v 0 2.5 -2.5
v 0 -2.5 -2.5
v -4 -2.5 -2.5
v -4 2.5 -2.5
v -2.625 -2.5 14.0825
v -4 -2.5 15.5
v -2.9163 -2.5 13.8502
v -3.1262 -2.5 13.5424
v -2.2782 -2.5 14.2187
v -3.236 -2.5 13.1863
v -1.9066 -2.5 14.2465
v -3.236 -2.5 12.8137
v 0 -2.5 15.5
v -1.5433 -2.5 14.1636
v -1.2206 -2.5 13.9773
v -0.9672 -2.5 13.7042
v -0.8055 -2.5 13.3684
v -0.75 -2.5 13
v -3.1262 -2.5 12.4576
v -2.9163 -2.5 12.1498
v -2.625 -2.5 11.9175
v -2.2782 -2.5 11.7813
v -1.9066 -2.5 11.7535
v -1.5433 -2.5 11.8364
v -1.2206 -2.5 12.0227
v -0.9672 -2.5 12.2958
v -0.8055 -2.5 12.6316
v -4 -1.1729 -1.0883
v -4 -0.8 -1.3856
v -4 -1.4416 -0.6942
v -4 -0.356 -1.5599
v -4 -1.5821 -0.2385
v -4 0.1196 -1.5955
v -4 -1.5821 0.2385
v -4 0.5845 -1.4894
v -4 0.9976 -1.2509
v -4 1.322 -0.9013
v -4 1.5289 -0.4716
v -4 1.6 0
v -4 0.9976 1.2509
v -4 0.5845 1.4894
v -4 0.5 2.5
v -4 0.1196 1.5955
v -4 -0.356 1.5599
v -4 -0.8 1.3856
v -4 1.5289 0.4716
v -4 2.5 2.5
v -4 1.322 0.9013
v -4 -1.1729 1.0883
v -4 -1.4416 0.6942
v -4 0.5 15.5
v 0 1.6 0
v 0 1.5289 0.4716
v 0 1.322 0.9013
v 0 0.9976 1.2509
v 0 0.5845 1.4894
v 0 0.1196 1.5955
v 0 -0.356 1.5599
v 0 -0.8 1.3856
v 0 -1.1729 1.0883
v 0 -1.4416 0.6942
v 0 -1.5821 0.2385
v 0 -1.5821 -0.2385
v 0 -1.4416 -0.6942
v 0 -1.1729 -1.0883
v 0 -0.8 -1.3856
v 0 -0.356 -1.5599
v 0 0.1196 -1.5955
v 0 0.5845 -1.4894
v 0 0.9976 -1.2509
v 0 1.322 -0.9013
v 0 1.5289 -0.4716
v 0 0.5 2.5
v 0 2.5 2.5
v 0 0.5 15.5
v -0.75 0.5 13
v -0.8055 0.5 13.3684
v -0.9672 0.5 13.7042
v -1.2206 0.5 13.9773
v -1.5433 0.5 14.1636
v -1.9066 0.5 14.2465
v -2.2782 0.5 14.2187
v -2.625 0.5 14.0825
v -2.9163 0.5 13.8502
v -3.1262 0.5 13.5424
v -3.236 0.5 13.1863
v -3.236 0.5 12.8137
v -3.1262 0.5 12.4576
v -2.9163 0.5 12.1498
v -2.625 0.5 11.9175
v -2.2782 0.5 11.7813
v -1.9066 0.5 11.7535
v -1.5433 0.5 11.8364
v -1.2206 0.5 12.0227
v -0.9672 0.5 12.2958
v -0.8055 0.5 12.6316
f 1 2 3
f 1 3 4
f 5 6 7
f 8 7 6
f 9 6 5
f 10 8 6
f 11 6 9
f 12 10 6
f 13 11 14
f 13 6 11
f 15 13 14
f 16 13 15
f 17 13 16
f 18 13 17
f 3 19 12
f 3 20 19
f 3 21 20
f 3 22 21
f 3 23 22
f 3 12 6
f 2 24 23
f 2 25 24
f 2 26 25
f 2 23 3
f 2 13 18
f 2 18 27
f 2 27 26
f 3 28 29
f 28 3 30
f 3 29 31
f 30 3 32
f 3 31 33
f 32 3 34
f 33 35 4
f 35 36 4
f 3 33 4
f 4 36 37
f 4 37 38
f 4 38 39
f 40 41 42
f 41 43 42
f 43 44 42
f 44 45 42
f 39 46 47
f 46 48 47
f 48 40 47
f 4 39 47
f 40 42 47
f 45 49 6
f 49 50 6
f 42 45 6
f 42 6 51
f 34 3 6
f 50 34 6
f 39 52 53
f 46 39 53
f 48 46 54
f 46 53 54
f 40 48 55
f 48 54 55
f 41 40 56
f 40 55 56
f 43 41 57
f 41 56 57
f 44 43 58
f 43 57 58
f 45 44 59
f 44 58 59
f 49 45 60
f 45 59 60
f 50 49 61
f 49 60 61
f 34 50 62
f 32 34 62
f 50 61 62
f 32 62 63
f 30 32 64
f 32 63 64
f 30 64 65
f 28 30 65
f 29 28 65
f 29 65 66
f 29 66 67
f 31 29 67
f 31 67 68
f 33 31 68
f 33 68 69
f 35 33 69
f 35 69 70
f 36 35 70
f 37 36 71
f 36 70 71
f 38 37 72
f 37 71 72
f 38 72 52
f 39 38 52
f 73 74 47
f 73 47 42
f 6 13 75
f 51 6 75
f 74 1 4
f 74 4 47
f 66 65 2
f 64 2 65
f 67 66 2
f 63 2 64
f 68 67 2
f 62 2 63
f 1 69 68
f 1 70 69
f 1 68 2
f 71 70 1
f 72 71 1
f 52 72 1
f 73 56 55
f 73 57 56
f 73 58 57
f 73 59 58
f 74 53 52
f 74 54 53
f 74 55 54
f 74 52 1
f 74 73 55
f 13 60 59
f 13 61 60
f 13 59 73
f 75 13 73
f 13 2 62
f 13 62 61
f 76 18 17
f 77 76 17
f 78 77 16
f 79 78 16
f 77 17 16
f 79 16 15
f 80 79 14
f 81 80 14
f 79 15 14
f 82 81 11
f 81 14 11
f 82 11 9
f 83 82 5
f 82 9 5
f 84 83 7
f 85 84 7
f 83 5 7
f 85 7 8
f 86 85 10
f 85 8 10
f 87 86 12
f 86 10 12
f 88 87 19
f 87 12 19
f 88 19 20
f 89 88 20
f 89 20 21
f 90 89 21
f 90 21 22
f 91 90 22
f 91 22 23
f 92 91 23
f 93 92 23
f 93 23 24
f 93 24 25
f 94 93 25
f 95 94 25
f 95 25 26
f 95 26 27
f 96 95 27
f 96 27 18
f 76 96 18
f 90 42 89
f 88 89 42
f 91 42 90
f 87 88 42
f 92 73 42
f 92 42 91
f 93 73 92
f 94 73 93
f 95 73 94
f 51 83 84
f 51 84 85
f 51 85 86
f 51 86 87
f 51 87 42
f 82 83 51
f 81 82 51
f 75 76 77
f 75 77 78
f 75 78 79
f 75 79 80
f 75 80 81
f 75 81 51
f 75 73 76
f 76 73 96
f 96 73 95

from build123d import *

# Parameters (mm, degrees)
F0_R     = 1.6
F0_W     = 3
F0_H     = 13
F1_DEPTH = 4
F2_R     = 1.25
F3_DEPTH = 25


# Not quite as in the source:
# - a feature names something its author has since deleted; it is built from what else it names


with BuildPart() as f1:
    # F0 (on Right) → F1 (new body)
    with BuildSketch(Plane.YZ):
        Polygon((-2.5, -2.5), (2.5, -2.5), (2.5, 2.5), (0.5, 2.5), (-2.5, 2.5), align=None)
        Circle(F0_R, mode=Mode.SUBTRACT)
        with Locations((-1, 9)):
            Rectangle(F0_W, F0_H)
    extrude(amount=-F1_DEPTH)

    # F2 (on face) → F3 (cut)
    with BuildSketch(Plane.XZ.offset(2.5)):
        with Locations((-2, 13)):
            Circle(F2_R)
    extrude(amount=-F3_DEPTH, mode=Mode.SUBTRACT)


solid = f1.part
